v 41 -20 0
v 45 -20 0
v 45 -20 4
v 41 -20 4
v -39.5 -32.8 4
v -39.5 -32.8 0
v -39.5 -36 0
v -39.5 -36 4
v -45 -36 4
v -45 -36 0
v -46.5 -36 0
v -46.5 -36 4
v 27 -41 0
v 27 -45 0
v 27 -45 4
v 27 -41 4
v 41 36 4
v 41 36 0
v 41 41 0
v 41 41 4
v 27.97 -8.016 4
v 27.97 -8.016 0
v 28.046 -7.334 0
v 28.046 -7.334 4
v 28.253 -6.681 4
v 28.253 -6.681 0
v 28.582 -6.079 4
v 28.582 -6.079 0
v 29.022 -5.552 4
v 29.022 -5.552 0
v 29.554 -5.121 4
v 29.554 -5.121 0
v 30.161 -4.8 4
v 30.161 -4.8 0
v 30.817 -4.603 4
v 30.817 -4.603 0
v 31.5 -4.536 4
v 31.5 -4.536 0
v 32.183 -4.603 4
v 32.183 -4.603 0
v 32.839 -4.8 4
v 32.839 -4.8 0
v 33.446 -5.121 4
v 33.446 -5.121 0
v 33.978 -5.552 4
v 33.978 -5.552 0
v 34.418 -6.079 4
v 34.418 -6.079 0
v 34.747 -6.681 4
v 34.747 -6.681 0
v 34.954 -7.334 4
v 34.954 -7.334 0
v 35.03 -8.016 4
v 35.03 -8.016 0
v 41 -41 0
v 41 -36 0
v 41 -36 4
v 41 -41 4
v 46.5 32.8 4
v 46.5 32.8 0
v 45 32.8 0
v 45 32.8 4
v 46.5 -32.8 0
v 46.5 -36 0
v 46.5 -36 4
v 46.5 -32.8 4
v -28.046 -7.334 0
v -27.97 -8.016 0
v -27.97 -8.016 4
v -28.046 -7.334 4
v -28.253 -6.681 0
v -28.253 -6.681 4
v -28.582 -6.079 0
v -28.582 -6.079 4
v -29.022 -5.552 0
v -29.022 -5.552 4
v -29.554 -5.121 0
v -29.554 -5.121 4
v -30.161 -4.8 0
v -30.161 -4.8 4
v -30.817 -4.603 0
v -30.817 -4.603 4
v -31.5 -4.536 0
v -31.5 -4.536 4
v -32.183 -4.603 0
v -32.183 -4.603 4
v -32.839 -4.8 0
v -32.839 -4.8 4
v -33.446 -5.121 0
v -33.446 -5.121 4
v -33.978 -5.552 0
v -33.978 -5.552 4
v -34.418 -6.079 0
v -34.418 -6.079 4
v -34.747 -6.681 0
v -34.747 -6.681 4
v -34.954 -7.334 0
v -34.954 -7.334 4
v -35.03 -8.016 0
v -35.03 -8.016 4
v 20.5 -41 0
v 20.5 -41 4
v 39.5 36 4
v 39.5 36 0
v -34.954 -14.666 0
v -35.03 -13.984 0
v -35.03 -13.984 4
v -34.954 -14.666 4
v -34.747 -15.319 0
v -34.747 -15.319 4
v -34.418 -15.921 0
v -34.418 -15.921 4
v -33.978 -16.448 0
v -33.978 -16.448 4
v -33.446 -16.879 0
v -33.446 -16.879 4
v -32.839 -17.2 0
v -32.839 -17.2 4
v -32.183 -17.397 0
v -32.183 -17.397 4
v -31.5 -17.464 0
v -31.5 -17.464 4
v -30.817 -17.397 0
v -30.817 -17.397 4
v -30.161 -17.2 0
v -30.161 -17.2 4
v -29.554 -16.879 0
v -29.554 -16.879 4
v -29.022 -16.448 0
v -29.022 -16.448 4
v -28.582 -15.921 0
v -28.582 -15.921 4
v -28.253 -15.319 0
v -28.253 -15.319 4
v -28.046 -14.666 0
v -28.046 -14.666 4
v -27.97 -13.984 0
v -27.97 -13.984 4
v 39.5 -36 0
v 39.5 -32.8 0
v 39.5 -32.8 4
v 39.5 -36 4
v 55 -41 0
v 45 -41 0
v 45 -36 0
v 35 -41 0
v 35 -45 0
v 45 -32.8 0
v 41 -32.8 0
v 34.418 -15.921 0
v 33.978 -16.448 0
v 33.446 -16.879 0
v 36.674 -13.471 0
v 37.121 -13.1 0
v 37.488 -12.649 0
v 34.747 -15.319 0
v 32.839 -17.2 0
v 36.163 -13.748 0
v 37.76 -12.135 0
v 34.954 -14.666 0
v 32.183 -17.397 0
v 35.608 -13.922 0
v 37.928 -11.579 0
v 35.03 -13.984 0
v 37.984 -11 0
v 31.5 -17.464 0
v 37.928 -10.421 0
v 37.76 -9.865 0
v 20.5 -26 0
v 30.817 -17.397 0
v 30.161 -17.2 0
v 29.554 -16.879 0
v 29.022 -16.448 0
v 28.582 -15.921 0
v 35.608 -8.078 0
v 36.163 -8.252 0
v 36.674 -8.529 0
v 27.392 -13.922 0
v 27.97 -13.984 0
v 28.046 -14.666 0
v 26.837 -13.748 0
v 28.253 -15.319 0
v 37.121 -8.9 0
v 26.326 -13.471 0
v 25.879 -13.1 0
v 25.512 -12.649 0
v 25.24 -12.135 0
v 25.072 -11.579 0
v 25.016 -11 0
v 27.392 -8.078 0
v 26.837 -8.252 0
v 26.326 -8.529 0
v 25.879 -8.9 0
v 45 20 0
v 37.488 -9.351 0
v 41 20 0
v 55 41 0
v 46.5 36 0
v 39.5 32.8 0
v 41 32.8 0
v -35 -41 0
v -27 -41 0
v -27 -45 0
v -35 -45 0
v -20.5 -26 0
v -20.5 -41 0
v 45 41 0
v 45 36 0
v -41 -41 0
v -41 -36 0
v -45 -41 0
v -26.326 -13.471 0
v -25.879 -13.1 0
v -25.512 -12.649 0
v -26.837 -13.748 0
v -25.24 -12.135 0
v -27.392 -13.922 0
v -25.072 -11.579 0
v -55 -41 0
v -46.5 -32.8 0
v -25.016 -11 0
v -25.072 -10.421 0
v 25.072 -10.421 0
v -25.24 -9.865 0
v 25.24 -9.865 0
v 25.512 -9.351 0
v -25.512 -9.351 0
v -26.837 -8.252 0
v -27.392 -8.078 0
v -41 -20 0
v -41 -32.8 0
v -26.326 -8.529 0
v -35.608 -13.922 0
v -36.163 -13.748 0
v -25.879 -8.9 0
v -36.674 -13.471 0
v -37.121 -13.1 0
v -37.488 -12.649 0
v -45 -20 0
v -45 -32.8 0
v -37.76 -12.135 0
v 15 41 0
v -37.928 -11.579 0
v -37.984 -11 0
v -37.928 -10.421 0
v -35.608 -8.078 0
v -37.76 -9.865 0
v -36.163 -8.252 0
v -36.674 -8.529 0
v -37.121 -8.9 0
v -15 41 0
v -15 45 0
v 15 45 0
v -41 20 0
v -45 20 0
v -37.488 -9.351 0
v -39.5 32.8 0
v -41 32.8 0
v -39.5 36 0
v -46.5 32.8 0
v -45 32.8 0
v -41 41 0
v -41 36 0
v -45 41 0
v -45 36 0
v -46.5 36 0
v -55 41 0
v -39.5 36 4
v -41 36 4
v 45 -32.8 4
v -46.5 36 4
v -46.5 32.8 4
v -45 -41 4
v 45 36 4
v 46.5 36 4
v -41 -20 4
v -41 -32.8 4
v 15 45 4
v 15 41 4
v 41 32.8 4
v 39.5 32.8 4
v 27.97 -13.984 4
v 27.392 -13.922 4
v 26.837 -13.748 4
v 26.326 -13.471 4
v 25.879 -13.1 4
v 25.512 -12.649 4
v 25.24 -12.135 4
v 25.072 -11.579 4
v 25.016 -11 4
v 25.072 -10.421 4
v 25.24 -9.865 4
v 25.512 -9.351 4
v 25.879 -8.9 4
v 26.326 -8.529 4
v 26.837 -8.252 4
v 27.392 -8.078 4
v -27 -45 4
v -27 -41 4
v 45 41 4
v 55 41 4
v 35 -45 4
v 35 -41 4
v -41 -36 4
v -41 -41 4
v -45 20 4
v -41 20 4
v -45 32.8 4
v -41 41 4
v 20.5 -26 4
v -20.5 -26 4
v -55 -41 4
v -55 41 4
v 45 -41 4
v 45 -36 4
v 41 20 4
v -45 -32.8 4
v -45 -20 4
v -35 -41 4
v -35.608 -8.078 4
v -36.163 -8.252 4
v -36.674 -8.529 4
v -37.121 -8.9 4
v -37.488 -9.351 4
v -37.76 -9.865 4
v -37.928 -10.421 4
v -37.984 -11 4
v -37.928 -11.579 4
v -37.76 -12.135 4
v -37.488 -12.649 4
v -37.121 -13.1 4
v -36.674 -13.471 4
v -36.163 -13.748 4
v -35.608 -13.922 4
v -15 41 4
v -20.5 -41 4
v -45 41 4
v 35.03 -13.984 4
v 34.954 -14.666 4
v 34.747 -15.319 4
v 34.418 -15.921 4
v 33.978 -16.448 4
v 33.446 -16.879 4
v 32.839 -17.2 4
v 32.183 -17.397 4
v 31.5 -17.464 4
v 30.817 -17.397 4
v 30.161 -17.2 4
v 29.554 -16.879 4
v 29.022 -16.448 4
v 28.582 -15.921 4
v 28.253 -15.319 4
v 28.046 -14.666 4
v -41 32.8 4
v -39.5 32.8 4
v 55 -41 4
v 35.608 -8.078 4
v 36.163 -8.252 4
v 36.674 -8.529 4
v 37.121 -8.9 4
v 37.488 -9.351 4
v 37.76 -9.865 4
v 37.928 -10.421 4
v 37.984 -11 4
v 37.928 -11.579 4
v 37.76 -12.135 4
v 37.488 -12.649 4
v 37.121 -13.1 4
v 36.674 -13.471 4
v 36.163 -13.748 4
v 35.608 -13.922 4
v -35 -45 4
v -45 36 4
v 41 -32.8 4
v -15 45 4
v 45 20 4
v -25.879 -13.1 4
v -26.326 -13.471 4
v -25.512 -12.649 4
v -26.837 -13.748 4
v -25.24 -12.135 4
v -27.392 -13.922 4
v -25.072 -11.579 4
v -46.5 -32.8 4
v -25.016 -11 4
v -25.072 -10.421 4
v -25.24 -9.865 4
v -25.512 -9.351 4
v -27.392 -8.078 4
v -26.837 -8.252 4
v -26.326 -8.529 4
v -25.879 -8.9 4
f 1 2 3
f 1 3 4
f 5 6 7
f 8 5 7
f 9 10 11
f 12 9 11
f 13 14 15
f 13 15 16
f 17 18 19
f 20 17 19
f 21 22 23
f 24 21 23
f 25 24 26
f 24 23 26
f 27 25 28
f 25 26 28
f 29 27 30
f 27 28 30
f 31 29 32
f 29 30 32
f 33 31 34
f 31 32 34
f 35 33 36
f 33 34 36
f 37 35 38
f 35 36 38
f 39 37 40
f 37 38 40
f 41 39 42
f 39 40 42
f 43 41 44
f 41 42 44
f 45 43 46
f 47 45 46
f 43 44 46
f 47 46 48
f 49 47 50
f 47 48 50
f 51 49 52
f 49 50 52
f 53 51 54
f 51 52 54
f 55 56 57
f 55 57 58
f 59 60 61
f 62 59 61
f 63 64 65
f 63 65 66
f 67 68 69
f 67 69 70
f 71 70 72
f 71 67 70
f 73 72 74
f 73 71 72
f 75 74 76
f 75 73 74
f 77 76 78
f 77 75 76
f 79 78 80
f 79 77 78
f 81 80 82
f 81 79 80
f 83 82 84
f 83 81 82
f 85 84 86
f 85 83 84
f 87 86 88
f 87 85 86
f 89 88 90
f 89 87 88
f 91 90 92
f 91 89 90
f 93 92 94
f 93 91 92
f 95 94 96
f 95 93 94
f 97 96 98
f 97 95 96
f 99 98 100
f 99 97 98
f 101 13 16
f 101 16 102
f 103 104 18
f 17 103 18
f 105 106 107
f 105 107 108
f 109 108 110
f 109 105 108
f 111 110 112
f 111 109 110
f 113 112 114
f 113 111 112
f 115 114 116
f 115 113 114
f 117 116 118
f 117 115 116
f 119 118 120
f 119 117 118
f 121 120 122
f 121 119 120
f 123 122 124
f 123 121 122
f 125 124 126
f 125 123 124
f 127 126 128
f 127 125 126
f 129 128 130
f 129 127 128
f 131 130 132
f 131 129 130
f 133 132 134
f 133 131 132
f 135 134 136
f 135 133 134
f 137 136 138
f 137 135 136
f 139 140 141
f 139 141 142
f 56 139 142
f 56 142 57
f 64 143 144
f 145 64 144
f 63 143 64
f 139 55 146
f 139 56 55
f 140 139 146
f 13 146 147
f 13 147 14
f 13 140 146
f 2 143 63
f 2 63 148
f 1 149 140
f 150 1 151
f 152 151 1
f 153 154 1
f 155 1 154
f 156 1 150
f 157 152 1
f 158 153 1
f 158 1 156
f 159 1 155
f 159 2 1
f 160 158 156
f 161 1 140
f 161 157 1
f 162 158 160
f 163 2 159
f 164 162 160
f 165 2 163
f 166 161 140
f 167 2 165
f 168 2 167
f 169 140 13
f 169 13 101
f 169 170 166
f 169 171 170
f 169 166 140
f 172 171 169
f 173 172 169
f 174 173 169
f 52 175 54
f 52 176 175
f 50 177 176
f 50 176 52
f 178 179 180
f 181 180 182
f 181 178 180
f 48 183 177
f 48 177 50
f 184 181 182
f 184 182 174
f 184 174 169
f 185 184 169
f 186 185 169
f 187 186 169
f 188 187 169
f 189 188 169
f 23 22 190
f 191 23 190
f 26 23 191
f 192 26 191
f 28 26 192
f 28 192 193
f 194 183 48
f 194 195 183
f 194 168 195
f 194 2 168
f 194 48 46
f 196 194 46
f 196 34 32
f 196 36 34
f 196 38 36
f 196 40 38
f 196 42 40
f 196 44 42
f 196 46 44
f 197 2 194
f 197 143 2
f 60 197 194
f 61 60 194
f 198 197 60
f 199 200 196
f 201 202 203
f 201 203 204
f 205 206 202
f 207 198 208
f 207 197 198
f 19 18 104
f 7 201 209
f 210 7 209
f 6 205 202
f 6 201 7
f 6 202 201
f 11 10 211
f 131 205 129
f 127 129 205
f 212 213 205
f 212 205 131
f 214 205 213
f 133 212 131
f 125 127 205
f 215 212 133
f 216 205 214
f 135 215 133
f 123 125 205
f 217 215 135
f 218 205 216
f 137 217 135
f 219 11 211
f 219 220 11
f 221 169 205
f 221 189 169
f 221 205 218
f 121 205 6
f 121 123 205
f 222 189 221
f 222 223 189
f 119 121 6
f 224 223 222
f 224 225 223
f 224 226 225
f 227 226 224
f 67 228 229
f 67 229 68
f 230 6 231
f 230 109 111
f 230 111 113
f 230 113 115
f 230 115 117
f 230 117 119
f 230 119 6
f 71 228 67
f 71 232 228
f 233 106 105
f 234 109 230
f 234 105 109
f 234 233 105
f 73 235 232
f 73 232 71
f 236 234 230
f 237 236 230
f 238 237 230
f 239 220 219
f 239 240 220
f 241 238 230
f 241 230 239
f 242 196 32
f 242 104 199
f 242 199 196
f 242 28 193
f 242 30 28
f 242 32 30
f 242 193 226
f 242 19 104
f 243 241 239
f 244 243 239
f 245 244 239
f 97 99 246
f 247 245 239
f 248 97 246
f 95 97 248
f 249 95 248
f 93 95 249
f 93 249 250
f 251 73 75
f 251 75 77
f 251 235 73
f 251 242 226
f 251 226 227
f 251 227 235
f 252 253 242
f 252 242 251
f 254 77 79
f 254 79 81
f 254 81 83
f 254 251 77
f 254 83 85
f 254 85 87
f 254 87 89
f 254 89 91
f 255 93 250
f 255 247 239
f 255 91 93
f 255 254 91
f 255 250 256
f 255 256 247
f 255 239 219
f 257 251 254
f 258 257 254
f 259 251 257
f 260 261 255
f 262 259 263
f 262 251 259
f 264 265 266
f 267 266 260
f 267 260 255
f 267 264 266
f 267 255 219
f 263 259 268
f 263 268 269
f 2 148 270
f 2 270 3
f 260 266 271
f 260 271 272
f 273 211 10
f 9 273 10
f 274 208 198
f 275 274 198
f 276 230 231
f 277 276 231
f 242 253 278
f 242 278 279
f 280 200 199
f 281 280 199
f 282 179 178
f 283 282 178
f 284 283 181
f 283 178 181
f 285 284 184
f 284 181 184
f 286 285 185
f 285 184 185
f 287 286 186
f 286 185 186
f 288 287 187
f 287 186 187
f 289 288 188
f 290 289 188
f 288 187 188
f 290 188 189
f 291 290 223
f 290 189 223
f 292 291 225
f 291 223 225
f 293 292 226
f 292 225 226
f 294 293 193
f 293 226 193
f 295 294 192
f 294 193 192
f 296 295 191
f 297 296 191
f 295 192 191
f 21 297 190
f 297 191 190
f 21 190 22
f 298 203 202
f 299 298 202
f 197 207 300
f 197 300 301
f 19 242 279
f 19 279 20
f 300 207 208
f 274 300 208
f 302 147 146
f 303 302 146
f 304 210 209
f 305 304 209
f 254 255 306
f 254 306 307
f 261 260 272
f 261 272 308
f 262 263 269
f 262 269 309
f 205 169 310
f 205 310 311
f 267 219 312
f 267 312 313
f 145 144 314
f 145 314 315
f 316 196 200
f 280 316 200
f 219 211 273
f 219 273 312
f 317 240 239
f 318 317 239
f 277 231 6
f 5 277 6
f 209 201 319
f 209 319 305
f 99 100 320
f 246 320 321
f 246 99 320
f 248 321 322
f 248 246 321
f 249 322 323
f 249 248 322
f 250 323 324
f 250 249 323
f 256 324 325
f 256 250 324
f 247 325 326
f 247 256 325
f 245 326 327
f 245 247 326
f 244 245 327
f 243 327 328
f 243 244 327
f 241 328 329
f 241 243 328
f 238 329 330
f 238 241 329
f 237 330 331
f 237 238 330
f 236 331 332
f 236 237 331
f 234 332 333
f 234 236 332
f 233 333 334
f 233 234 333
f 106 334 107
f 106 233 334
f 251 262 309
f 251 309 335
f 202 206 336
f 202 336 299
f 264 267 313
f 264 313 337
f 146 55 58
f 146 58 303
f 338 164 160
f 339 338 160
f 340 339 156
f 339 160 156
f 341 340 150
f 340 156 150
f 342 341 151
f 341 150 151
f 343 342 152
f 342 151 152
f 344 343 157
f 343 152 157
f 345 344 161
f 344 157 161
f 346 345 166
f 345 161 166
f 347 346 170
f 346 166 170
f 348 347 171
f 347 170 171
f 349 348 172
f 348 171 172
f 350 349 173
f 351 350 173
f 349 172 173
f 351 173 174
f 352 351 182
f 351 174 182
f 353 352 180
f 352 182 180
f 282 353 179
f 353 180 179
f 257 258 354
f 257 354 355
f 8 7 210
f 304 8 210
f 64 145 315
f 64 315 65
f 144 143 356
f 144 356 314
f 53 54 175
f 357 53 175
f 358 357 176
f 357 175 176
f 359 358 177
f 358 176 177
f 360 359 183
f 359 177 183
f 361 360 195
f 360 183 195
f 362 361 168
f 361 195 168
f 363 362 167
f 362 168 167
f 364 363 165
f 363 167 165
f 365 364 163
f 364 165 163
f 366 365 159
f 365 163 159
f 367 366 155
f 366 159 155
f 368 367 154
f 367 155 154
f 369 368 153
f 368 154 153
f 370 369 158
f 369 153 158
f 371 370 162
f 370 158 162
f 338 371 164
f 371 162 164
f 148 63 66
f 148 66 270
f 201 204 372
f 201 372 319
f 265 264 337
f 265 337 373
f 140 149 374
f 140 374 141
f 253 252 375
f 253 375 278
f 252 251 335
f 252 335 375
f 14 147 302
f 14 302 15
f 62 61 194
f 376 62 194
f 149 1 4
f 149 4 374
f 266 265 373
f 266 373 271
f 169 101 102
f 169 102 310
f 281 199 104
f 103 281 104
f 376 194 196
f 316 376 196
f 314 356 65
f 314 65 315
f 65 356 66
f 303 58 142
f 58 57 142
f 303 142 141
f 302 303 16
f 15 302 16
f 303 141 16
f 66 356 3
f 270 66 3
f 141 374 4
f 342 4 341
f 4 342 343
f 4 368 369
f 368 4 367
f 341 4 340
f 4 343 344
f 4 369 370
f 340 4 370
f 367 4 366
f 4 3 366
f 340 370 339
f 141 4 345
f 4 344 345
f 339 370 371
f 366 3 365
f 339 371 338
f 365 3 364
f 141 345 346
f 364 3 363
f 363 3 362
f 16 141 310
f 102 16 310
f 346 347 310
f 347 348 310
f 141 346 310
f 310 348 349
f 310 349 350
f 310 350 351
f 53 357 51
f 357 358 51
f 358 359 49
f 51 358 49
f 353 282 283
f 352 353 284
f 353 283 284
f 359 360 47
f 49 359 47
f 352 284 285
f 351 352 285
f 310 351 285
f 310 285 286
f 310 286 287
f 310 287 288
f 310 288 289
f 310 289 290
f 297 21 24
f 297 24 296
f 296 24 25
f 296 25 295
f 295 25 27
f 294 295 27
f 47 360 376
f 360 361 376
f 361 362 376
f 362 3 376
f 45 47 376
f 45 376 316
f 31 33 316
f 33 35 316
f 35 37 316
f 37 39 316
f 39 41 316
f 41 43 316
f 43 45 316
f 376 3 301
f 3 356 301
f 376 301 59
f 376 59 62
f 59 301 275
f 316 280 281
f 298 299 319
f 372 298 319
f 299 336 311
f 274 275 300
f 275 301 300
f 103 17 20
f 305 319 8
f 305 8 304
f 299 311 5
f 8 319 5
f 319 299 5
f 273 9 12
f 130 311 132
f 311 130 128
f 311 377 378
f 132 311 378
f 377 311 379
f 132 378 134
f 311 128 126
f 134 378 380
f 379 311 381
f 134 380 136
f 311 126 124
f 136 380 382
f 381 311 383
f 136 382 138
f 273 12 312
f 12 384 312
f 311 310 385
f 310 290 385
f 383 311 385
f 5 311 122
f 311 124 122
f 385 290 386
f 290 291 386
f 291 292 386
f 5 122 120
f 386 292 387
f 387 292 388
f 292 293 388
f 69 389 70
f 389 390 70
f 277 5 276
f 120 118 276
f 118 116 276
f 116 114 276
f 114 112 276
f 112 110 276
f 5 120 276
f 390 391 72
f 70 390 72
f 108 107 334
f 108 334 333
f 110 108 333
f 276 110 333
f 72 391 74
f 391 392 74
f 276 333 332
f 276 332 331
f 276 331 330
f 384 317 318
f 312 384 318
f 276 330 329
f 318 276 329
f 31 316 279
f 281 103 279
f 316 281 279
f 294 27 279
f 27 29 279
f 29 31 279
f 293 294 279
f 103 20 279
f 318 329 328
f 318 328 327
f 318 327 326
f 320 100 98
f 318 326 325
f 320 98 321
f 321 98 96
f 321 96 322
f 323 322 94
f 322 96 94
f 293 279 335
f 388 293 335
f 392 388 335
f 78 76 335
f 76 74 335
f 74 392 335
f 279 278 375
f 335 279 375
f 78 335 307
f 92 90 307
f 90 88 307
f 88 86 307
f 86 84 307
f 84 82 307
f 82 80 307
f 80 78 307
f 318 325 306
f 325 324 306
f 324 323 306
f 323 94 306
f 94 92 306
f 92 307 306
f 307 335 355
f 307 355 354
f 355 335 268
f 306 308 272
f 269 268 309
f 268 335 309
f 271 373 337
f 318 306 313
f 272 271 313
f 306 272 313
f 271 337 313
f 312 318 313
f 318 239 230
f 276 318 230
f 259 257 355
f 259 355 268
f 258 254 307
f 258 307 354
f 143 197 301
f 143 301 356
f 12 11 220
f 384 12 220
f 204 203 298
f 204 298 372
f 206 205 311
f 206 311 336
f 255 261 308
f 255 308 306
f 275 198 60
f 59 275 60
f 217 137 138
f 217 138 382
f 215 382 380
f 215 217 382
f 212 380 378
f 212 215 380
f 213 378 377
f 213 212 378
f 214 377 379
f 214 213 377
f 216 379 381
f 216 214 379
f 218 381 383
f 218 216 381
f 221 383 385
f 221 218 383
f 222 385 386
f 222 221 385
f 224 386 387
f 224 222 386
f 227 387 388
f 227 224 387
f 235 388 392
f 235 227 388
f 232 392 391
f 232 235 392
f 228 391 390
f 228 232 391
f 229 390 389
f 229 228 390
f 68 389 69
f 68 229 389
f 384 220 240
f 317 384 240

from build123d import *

# Parameters (mm, degrees)
BOSS_EXTRUDE1_DEPTH = 4
CUT_EXTRUDE1_DEPTH  = 5
CUT_EXTRUDE2_DEPTH  = 10
SKETCH4_W           = 8
SKETCH4_H           = 4
BOSS_EXTRUDE2_DEPTH = 4


with BuildPart() as part:
    # Sketch1 → Boss-Extrude1 (new body)
    with BuildSketch(Plane.XY):
        Polygon((20.5, -41), (20.5, -26), (-20.5, -26), (-20.5, -41), (-55, -41), (-55, 41), (-15, 41), (-15, 45), (15, 45), (15, 41), (55, 41), (55, -41), align=None)
    extrude(amount=BOSS_EXTRUDE1_DEPTH)

    # Sketch2 → Cut-Extrude1 (cut)
    with BuildSketch(Plane(origin=(0, 0, 0), x_dir=(-1, 0, 0), z_dir=(0, 0, -1))):
        Polygon((-41, -36), (-41, -41), (-45, -41), (-45, -36), (-46.5, -36), (-46.5, -32.8), (-45, -32.8), (-45, -20), (-41, -20), (-41, -32.8), (-39.5, -32.8), (-39.5, -36), align=None)
        Polygon((45, -41), (45, -36), (46.5, -36), (46.5, -32.8), (45, -32.8), (45, -20), (41, -20), (41, -32.8), (39.5, -32.8), (39.5, -36), (41, -36), (41, -41), align=None)
        Polygon((41, 36), (41, 41), (45, 41), (45, 36), (46.5, 36), (46.5, 32.8), (45, 32.8), (45, 20), (41, 20), (41, 32.8), (39.5, 32.8), (39.5, 36), align=None)
        Polygon((-45, 41), (-45, 36), (-46.5, 36), (-46.5, 32.8), (-45, 32.8), (-45, 20), (-41, 20), (-41, 32.8), (-39.5, 32.8), (-39.5, 36), (-41, 36), (-41, 41), align=None)
    extrude(amount=-CUT_EXTRUDE1_DEPTH, mode=Mode.SUBTRACT)

    # Sketch3 → Cut-Extrude2 (cut)
    with BuildSketch(Plane(origin=(0, 0, 0), x_dir=(-1, 0, 0), z_dir=(0, 0, -1))):
        with BuildLine():
            ThreePointArc((-27.96981837, -8.015850853), (-31.5, -4.536419435), (-35.03018163, -8.015850853))
            ThreePointArc((-35.03018163, -8.015850853), (-37.984301772, -11), (-35.03018163, -13.984149147))
            ThreePointArc((-35.03018163, -13.984149147), (-31.5, -17.463580565), (-27.96981837, -13.984149147))
            ThreePointArc((-27.96981837, -13.984149147), (-25.015698228, -11), (-27.96981837, -8.015850853))
        make_face()
        with BuildLine():
            ThreePointArc((35.03018163, -8.015850853), (37.984301772, -11), (35.03018163, -13.984149147))
            ThreePointArc((35.03018163, -13.984149147), (31.5, -17.463580565), (27.96981837, -13.984149147))
            ThreePointArc((27.96981837, -13.984149147), (25.015698228, -11), (27.96981837, -8.015850853))
            ThreePointArc((27.96981837, -8.015850853), (31.5, -4.536419435), (35.03018163, -8.015850853))
        make_face()
    extrude(amount=-CUT_EXTRUDE2_DEPTH, mode=Mode.SUBTRACT)

    # Sketch4 → Boss-Extrude2 (add)
    with BuildSketch(Plane(origin=(0, 0, 0), x_dir=(-1, 0, 0), z_dir=(0, 0, -1))):
        with Locations((-31, -43)):
            Rectangle(SKETCH4_W, SKETCH4_H)
        with Locations((31, -43)):
            Rectangle(SKETCH4_W, SKETCH4_H)
    extrude(amount=-BOSS_EXTRUDE2_DEPTH)


solid = part.part
